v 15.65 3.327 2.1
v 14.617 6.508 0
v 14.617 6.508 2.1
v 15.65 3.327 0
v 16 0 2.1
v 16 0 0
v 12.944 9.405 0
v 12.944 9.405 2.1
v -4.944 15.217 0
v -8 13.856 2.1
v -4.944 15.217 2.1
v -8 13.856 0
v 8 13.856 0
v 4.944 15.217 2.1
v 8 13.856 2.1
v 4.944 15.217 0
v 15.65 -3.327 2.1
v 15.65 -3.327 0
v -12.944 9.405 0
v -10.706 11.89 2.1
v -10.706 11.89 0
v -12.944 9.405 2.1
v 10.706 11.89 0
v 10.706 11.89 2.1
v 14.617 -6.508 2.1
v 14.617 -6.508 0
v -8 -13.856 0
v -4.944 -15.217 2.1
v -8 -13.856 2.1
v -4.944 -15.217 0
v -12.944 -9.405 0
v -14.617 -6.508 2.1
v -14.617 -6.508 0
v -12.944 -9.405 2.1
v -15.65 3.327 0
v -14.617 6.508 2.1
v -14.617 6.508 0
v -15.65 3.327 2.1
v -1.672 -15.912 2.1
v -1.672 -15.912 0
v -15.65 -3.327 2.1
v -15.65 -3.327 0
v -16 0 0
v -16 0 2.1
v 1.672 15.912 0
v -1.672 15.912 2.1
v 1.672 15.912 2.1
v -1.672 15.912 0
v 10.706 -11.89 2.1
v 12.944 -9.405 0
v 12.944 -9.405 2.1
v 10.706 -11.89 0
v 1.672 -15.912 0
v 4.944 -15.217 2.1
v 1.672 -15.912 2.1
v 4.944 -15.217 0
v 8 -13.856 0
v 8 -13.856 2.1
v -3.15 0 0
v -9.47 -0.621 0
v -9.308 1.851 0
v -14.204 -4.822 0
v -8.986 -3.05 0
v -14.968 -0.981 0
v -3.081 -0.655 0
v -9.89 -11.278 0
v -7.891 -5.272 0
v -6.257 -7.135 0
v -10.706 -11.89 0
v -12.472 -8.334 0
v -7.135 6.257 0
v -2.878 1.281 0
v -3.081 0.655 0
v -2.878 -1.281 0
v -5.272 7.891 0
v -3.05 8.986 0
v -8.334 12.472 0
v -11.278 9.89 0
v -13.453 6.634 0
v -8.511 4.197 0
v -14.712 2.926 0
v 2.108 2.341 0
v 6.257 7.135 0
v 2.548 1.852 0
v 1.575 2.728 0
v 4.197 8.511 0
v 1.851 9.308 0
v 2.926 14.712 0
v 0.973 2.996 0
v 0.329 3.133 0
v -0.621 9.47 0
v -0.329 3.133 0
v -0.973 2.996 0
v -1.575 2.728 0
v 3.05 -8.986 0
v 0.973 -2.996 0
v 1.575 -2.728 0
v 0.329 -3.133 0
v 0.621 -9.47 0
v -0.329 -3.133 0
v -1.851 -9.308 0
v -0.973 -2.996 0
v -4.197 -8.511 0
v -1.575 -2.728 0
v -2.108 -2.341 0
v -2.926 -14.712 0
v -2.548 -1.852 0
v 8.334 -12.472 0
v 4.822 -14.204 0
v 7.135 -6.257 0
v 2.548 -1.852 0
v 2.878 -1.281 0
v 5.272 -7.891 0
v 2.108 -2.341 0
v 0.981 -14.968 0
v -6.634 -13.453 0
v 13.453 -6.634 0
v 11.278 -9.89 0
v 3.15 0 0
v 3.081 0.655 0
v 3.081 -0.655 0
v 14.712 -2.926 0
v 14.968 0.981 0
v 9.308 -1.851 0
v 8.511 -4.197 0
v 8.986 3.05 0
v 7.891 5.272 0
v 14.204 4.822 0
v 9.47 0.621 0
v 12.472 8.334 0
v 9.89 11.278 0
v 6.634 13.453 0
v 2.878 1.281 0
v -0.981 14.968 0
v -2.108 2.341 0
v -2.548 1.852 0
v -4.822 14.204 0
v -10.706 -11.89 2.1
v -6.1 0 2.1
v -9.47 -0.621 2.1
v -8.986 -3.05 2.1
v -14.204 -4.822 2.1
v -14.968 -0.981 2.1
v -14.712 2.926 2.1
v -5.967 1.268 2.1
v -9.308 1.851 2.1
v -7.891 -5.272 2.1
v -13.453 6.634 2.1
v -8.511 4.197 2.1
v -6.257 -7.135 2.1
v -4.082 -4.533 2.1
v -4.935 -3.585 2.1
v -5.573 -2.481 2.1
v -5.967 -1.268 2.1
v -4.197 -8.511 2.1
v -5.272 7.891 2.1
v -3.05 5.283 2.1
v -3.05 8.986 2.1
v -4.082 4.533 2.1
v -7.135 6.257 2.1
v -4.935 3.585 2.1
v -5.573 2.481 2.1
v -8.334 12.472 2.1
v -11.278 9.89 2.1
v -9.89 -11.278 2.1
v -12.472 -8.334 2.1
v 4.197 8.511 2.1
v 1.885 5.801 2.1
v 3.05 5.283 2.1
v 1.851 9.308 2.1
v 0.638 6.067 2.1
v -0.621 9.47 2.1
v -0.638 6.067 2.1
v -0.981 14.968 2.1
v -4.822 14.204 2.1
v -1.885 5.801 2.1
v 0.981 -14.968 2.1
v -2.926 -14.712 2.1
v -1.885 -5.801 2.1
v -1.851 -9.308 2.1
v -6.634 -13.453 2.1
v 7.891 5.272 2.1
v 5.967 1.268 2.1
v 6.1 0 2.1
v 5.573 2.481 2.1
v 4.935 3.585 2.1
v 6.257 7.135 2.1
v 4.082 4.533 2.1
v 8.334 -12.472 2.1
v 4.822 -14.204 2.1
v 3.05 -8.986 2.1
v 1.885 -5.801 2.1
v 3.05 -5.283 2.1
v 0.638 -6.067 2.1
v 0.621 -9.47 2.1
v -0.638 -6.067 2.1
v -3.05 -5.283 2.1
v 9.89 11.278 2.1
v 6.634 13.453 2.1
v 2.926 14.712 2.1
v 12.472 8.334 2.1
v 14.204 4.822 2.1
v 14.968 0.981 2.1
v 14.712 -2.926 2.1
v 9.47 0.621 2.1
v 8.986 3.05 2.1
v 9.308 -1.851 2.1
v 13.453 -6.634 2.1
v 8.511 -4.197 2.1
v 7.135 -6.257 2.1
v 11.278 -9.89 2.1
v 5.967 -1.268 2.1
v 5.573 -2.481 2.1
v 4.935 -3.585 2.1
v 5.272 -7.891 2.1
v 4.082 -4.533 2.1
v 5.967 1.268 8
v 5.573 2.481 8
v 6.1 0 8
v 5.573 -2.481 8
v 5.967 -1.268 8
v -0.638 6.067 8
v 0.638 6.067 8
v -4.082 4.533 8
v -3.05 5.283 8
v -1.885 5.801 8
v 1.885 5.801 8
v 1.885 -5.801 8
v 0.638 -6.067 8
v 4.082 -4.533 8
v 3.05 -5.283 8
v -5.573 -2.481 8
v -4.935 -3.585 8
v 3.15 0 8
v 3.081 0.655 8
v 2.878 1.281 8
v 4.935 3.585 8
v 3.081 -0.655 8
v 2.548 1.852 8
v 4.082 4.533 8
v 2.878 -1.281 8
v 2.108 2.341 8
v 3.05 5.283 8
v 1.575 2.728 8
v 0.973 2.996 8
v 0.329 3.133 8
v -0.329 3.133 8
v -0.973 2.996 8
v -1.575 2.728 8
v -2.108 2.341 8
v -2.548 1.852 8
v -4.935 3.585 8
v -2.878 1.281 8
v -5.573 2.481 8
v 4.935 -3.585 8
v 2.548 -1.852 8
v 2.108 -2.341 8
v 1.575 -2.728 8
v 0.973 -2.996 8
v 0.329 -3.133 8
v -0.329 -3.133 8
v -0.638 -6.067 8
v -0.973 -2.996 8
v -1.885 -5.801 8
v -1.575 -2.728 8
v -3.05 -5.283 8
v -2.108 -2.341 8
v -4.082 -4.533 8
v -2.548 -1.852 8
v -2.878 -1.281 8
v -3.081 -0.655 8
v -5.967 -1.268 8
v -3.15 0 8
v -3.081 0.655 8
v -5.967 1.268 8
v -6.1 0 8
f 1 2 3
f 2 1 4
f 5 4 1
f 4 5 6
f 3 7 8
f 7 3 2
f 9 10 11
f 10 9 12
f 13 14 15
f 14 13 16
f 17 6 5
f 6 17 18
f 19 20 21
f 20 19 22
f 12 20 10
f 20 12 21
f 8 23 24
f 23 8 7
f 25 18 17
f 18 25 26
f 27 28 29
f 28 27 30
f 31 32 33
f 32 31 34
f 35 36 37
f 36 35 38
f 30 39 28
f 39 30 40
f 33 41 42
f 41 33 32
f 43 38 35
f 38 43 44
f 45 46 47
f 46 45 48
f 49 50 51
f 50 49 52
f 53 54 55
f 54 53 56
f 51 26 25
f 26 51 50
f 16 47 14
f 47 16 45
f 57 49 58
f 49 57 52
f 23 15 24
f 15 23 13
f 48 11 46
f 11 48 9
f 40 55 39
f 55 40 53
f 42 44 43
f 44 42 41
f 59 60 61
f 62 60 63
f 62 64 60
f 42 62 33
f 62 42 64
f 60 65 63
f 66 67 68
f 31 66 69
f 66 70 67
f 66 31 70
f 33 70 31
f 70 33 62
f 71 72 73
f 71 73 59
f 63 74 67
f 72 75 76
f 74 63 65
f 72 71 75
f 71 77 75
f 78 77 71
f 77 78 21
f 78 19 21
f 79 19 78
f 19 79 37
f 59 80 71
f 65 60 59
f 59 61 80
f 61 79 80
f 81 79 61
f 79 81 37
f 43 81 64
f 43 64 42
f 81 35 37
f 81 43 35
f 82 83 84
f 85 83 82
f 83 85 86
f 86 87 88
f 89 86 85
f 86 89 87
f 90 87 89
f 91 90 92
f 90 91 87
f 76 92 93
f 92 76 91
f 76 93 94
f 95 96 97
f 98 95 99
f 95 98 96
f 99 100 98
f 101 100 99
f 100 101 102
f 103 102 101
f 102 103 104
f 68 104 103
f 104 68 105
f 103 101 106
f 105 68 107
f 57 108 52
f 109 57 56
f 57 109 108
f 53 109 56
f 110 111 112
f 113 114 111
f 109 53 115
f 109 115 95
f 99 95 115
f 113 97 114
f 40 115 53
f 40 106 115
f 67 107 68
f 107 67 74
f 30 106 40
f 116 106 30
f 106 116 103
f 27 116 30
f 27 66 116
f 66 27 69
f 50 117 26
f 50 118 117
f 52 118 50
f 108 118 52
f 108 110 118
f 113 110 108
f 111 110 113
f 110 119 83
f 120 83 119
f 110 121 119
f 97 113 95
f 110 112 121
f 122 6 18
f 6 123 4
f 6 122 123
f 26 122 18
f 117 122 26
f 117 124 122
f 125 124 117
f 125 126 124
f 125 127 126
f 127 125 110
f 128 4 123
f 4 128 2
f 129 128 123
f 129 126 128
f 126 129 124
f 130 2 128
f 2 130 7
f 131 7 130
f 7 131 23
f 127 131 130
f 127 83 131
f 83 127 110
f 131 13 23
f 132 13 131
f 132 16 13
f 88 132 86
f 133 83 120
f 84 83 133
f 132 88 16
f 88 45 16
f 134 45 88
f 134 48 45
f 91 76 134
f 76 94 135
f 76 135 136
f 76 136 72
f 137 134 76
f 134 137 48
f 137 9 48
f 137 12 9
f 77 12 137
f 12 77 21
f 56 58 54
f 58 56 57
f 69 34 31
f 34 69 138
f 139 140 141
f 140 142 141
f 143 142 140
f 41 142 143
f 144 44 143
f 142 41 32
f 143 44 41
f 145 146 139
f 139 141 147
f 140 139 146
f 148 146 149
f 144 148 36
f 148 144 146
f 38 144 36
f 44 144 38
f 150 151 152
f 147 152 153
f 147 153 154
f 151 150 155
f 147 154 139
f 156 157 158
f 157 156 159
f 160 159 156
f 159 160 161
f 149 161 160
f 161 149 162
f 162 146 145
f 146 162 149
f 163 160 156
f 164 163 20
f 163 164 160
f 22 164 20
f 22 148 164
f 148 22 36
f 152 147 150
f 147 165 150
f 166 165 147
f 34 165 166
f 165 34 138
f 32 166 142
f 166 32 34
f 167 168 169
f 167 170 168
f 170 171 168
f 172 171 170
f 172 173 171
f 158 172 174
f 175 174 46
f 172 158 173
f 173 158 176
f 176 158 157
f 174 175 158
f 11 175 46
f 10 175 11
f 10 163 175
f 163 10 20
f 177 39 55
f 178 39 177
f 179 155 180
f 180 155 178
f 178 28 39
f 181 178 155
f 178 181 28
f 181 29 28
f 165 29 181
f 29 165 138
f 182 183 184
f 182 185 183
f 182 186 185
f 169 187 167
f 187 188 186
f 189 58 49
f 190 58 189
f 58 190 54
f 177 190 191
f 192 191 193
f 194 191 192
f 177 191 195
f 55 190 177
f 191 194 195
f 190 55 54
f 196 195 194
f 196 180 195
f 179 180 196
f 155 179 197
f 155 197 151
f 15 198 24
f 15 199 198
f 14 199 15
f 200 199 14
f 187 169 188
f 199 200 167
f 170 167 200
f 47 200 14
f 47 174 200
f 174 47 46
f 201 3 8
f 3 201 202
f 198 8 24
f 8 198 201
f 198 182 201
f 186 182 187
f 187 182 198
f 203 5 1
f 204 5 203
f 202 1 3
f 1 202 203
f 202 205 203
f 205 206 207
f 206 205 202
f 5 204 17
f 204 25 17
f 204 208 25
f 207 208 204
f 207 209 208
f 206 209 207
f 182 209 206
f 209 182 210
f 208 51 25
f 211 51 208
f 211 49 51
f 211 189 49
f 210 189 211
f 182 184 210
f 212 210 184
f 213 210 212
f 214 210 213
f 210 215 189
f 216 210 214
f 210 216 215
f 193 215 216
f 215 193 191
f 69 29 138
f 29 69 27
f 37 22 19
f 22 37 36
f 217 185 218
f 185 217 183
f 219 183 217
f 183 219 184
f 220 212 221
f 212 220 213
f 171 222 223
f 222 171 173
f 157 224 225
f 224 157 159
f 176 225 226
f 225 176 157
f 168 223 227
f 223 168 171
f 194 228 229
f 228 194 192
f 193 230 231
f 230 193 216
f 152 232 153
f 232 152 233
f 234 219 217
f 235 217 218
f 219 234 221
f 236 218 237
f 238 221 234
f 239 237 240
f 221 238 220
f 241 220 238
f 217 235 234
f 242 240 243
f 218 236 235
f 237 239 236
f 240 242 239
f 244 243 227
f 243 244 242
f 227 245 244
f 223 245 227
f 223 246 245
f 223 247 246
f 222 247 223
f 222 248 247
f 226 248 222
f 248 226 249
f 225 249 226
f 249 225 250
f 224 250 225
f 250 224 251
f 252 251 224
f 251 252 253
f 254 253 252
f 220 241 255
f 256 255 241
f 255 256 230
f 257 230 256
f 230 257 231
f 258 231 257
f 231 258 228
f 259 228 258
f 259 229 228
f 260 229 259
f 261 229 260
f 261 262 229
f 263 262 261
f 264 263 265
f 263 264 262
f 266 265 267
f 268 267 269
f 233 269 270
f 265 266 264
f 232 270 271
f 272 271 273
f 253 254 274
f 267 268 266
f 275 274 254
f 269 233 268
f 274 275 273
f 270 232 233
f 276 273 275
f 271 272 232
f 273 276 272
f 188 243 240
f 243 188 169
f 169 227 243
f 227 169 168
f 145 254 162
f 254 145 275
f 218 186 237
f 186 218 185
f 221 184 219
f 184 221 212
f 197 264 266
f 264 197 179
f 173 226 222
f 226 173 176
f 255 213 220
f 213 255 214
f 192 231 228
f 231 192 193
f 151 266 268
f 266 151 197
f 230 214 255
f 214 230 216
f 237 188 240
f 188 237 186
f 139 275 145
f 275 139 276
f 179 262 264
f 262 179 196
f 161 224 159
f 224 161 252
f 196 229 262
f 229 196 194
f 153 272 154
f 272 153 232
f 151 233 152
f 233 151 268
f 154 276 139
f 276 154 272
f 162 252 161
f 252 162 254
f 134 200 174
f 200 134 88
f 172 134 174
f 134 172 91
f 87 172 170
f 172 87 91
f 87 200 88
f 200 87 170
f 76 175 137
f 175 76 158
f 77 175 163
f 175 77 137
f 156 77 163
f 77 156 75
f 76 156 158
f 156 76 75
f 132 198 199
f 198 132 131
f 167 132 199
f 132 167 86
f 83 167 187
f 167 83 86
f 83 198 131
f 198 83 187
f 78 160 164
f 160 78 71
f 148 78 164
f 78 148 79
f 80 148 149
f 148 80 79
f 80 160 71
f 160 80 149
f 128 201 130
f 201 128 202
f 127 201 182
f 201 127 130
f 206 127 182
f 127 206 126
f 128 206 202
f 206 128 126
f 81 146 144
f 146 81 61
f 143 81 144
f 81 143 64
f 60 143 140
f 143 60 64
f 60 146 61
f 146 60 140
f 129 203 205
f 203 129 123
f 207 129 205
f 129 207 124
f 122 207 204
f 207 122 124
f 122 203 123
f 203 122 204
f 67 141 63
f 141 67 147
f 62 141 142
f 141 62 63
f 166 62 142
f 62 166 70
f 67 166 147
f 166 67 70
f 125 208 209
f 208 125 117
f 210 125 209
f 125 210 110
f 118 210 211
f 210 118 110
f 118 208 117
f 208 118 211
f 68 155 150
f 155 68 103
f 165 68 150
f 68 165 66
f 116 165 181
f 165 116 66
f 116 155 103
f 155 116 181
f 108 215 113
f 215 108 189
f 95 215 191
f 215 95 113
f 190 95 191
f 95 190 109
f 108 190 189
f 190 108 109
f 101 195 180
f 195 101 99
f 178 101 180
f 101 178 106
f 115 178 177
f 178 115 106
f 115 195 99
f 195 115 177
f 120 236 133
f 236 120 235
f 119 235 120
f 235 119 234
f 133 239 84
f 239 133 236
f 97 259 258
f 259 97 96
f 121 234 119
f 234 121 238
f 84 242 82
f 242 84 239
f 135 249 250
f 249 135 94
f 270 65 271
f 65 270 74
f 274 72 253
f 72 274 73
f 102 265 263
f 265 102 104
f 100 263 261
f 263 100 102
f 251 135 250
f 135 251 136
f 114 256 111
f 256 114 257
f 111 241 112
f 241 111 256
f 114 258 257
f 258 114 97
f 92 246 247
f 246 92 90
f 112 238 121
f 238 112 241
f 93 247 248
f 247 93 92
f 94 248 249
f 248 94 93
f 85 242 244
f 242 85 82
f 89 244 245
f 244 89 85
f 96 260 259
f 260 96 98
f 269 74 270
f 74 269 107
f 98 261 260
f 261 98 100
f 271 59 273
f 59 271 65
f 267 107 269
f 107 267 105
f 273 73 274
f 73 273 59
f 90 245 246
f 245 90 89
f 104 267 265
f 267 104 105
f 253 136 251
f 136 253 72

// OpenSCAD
NUM_SECTIONS = 24;	/* number of interrupters*2 */
R_OUTER = 16;			/* outer radius of the encoder */
R_INNER = 9.5;				/* inner radius -> filled */
R_INNER2 = 9.5;			/* inner radius -> inner radius 2, phase shifted interrupters for direction detection */
R_HOLE = 3.15;			/* mounting hole radius */
R_MOUNT = 6.1;				/* mounting hole outline radius */
R_CROSS = 1.9;			/* center-cross for 2d encoders*/
BORDER = 1;				/* a filled border  */
THICKNESS = 2.1; /* thickness of the encoder */
THICKNESS_MOUNT = 8  ;  /* thickness of the mouting hole outline */
INT_MODIFIER = 0;  /* interrupter-width modifier
								range:[-1..1] 
								=0 => 	interrupter = hole 
								<0 =>	interrupter > hole
								>0 => interrupter < hole
							*/
    
$fs = 0.01;

/* generates encoder contour */
module encoder_contour(n,rin,rout,mod){
	 for (i = [1:2:n])
    {
        assign (a1 = i*360/n, a2 = (i+1+mod)*360/n )
        {	
                polygon(points=[
						[cos(a2)*rin,sin(a2)*rin],
						[cos(a1)*rin,sin(a1)*rin],
						[cos(a1)*rout,sin(a1)*rout],
						[cos(a2)*rout,sin(a2)*rout] 
					]);
			}
    }	
}

/* use this to create a hole outline */
module hole2d(rhole,rcross){
	 circle(r = rhole);
	 polygon(points=[[0,0.1],[rcross,0],[0,-0.1],[-rcross,0] ] );
	 polygon(points=[[0.1,0],[0,rcross],[-0.1,0],[0,-rcross] ] );
}

module encoder3d(n,rin,rin2,rout,rhole,rmount,border,mod,t,tm) {
	echo();
	difference(){
		union(){
			cylinder(h=t,r=rout);
			cylinder(h=tm,r=rmount);			
		}
		linear_extrude(height=5*t,center=true) encoder_contour(n,rin,rin2,mod);
		rotate([0,0,360/(4*n)]) linear_extrude(height=5*t,center=true) encoder_contour(n,rin2-$fs,rout-border,mod);
		cylinder(h=5*tm,r=rhole,center=true);
	}
}

module encoder2d(rin,rout,rhole,rcross,mod) {
	hole2d(rhole,rcross);
	encoder_contour(rin,rout,mod);
}


encoder3d(NUM_SECTIONS,R_INNER,R_INNER2,R_OUTER,R_HOLE,R_MOUNT,BORDER,INT_MODIFIER,THICKNESS,THICKNESS_MOUNT);
//encoder2d(NUM_SECTIONS,R_INNER,R_OUTER,R_HOLE,R_CROSS,INT_MODIFIER);
